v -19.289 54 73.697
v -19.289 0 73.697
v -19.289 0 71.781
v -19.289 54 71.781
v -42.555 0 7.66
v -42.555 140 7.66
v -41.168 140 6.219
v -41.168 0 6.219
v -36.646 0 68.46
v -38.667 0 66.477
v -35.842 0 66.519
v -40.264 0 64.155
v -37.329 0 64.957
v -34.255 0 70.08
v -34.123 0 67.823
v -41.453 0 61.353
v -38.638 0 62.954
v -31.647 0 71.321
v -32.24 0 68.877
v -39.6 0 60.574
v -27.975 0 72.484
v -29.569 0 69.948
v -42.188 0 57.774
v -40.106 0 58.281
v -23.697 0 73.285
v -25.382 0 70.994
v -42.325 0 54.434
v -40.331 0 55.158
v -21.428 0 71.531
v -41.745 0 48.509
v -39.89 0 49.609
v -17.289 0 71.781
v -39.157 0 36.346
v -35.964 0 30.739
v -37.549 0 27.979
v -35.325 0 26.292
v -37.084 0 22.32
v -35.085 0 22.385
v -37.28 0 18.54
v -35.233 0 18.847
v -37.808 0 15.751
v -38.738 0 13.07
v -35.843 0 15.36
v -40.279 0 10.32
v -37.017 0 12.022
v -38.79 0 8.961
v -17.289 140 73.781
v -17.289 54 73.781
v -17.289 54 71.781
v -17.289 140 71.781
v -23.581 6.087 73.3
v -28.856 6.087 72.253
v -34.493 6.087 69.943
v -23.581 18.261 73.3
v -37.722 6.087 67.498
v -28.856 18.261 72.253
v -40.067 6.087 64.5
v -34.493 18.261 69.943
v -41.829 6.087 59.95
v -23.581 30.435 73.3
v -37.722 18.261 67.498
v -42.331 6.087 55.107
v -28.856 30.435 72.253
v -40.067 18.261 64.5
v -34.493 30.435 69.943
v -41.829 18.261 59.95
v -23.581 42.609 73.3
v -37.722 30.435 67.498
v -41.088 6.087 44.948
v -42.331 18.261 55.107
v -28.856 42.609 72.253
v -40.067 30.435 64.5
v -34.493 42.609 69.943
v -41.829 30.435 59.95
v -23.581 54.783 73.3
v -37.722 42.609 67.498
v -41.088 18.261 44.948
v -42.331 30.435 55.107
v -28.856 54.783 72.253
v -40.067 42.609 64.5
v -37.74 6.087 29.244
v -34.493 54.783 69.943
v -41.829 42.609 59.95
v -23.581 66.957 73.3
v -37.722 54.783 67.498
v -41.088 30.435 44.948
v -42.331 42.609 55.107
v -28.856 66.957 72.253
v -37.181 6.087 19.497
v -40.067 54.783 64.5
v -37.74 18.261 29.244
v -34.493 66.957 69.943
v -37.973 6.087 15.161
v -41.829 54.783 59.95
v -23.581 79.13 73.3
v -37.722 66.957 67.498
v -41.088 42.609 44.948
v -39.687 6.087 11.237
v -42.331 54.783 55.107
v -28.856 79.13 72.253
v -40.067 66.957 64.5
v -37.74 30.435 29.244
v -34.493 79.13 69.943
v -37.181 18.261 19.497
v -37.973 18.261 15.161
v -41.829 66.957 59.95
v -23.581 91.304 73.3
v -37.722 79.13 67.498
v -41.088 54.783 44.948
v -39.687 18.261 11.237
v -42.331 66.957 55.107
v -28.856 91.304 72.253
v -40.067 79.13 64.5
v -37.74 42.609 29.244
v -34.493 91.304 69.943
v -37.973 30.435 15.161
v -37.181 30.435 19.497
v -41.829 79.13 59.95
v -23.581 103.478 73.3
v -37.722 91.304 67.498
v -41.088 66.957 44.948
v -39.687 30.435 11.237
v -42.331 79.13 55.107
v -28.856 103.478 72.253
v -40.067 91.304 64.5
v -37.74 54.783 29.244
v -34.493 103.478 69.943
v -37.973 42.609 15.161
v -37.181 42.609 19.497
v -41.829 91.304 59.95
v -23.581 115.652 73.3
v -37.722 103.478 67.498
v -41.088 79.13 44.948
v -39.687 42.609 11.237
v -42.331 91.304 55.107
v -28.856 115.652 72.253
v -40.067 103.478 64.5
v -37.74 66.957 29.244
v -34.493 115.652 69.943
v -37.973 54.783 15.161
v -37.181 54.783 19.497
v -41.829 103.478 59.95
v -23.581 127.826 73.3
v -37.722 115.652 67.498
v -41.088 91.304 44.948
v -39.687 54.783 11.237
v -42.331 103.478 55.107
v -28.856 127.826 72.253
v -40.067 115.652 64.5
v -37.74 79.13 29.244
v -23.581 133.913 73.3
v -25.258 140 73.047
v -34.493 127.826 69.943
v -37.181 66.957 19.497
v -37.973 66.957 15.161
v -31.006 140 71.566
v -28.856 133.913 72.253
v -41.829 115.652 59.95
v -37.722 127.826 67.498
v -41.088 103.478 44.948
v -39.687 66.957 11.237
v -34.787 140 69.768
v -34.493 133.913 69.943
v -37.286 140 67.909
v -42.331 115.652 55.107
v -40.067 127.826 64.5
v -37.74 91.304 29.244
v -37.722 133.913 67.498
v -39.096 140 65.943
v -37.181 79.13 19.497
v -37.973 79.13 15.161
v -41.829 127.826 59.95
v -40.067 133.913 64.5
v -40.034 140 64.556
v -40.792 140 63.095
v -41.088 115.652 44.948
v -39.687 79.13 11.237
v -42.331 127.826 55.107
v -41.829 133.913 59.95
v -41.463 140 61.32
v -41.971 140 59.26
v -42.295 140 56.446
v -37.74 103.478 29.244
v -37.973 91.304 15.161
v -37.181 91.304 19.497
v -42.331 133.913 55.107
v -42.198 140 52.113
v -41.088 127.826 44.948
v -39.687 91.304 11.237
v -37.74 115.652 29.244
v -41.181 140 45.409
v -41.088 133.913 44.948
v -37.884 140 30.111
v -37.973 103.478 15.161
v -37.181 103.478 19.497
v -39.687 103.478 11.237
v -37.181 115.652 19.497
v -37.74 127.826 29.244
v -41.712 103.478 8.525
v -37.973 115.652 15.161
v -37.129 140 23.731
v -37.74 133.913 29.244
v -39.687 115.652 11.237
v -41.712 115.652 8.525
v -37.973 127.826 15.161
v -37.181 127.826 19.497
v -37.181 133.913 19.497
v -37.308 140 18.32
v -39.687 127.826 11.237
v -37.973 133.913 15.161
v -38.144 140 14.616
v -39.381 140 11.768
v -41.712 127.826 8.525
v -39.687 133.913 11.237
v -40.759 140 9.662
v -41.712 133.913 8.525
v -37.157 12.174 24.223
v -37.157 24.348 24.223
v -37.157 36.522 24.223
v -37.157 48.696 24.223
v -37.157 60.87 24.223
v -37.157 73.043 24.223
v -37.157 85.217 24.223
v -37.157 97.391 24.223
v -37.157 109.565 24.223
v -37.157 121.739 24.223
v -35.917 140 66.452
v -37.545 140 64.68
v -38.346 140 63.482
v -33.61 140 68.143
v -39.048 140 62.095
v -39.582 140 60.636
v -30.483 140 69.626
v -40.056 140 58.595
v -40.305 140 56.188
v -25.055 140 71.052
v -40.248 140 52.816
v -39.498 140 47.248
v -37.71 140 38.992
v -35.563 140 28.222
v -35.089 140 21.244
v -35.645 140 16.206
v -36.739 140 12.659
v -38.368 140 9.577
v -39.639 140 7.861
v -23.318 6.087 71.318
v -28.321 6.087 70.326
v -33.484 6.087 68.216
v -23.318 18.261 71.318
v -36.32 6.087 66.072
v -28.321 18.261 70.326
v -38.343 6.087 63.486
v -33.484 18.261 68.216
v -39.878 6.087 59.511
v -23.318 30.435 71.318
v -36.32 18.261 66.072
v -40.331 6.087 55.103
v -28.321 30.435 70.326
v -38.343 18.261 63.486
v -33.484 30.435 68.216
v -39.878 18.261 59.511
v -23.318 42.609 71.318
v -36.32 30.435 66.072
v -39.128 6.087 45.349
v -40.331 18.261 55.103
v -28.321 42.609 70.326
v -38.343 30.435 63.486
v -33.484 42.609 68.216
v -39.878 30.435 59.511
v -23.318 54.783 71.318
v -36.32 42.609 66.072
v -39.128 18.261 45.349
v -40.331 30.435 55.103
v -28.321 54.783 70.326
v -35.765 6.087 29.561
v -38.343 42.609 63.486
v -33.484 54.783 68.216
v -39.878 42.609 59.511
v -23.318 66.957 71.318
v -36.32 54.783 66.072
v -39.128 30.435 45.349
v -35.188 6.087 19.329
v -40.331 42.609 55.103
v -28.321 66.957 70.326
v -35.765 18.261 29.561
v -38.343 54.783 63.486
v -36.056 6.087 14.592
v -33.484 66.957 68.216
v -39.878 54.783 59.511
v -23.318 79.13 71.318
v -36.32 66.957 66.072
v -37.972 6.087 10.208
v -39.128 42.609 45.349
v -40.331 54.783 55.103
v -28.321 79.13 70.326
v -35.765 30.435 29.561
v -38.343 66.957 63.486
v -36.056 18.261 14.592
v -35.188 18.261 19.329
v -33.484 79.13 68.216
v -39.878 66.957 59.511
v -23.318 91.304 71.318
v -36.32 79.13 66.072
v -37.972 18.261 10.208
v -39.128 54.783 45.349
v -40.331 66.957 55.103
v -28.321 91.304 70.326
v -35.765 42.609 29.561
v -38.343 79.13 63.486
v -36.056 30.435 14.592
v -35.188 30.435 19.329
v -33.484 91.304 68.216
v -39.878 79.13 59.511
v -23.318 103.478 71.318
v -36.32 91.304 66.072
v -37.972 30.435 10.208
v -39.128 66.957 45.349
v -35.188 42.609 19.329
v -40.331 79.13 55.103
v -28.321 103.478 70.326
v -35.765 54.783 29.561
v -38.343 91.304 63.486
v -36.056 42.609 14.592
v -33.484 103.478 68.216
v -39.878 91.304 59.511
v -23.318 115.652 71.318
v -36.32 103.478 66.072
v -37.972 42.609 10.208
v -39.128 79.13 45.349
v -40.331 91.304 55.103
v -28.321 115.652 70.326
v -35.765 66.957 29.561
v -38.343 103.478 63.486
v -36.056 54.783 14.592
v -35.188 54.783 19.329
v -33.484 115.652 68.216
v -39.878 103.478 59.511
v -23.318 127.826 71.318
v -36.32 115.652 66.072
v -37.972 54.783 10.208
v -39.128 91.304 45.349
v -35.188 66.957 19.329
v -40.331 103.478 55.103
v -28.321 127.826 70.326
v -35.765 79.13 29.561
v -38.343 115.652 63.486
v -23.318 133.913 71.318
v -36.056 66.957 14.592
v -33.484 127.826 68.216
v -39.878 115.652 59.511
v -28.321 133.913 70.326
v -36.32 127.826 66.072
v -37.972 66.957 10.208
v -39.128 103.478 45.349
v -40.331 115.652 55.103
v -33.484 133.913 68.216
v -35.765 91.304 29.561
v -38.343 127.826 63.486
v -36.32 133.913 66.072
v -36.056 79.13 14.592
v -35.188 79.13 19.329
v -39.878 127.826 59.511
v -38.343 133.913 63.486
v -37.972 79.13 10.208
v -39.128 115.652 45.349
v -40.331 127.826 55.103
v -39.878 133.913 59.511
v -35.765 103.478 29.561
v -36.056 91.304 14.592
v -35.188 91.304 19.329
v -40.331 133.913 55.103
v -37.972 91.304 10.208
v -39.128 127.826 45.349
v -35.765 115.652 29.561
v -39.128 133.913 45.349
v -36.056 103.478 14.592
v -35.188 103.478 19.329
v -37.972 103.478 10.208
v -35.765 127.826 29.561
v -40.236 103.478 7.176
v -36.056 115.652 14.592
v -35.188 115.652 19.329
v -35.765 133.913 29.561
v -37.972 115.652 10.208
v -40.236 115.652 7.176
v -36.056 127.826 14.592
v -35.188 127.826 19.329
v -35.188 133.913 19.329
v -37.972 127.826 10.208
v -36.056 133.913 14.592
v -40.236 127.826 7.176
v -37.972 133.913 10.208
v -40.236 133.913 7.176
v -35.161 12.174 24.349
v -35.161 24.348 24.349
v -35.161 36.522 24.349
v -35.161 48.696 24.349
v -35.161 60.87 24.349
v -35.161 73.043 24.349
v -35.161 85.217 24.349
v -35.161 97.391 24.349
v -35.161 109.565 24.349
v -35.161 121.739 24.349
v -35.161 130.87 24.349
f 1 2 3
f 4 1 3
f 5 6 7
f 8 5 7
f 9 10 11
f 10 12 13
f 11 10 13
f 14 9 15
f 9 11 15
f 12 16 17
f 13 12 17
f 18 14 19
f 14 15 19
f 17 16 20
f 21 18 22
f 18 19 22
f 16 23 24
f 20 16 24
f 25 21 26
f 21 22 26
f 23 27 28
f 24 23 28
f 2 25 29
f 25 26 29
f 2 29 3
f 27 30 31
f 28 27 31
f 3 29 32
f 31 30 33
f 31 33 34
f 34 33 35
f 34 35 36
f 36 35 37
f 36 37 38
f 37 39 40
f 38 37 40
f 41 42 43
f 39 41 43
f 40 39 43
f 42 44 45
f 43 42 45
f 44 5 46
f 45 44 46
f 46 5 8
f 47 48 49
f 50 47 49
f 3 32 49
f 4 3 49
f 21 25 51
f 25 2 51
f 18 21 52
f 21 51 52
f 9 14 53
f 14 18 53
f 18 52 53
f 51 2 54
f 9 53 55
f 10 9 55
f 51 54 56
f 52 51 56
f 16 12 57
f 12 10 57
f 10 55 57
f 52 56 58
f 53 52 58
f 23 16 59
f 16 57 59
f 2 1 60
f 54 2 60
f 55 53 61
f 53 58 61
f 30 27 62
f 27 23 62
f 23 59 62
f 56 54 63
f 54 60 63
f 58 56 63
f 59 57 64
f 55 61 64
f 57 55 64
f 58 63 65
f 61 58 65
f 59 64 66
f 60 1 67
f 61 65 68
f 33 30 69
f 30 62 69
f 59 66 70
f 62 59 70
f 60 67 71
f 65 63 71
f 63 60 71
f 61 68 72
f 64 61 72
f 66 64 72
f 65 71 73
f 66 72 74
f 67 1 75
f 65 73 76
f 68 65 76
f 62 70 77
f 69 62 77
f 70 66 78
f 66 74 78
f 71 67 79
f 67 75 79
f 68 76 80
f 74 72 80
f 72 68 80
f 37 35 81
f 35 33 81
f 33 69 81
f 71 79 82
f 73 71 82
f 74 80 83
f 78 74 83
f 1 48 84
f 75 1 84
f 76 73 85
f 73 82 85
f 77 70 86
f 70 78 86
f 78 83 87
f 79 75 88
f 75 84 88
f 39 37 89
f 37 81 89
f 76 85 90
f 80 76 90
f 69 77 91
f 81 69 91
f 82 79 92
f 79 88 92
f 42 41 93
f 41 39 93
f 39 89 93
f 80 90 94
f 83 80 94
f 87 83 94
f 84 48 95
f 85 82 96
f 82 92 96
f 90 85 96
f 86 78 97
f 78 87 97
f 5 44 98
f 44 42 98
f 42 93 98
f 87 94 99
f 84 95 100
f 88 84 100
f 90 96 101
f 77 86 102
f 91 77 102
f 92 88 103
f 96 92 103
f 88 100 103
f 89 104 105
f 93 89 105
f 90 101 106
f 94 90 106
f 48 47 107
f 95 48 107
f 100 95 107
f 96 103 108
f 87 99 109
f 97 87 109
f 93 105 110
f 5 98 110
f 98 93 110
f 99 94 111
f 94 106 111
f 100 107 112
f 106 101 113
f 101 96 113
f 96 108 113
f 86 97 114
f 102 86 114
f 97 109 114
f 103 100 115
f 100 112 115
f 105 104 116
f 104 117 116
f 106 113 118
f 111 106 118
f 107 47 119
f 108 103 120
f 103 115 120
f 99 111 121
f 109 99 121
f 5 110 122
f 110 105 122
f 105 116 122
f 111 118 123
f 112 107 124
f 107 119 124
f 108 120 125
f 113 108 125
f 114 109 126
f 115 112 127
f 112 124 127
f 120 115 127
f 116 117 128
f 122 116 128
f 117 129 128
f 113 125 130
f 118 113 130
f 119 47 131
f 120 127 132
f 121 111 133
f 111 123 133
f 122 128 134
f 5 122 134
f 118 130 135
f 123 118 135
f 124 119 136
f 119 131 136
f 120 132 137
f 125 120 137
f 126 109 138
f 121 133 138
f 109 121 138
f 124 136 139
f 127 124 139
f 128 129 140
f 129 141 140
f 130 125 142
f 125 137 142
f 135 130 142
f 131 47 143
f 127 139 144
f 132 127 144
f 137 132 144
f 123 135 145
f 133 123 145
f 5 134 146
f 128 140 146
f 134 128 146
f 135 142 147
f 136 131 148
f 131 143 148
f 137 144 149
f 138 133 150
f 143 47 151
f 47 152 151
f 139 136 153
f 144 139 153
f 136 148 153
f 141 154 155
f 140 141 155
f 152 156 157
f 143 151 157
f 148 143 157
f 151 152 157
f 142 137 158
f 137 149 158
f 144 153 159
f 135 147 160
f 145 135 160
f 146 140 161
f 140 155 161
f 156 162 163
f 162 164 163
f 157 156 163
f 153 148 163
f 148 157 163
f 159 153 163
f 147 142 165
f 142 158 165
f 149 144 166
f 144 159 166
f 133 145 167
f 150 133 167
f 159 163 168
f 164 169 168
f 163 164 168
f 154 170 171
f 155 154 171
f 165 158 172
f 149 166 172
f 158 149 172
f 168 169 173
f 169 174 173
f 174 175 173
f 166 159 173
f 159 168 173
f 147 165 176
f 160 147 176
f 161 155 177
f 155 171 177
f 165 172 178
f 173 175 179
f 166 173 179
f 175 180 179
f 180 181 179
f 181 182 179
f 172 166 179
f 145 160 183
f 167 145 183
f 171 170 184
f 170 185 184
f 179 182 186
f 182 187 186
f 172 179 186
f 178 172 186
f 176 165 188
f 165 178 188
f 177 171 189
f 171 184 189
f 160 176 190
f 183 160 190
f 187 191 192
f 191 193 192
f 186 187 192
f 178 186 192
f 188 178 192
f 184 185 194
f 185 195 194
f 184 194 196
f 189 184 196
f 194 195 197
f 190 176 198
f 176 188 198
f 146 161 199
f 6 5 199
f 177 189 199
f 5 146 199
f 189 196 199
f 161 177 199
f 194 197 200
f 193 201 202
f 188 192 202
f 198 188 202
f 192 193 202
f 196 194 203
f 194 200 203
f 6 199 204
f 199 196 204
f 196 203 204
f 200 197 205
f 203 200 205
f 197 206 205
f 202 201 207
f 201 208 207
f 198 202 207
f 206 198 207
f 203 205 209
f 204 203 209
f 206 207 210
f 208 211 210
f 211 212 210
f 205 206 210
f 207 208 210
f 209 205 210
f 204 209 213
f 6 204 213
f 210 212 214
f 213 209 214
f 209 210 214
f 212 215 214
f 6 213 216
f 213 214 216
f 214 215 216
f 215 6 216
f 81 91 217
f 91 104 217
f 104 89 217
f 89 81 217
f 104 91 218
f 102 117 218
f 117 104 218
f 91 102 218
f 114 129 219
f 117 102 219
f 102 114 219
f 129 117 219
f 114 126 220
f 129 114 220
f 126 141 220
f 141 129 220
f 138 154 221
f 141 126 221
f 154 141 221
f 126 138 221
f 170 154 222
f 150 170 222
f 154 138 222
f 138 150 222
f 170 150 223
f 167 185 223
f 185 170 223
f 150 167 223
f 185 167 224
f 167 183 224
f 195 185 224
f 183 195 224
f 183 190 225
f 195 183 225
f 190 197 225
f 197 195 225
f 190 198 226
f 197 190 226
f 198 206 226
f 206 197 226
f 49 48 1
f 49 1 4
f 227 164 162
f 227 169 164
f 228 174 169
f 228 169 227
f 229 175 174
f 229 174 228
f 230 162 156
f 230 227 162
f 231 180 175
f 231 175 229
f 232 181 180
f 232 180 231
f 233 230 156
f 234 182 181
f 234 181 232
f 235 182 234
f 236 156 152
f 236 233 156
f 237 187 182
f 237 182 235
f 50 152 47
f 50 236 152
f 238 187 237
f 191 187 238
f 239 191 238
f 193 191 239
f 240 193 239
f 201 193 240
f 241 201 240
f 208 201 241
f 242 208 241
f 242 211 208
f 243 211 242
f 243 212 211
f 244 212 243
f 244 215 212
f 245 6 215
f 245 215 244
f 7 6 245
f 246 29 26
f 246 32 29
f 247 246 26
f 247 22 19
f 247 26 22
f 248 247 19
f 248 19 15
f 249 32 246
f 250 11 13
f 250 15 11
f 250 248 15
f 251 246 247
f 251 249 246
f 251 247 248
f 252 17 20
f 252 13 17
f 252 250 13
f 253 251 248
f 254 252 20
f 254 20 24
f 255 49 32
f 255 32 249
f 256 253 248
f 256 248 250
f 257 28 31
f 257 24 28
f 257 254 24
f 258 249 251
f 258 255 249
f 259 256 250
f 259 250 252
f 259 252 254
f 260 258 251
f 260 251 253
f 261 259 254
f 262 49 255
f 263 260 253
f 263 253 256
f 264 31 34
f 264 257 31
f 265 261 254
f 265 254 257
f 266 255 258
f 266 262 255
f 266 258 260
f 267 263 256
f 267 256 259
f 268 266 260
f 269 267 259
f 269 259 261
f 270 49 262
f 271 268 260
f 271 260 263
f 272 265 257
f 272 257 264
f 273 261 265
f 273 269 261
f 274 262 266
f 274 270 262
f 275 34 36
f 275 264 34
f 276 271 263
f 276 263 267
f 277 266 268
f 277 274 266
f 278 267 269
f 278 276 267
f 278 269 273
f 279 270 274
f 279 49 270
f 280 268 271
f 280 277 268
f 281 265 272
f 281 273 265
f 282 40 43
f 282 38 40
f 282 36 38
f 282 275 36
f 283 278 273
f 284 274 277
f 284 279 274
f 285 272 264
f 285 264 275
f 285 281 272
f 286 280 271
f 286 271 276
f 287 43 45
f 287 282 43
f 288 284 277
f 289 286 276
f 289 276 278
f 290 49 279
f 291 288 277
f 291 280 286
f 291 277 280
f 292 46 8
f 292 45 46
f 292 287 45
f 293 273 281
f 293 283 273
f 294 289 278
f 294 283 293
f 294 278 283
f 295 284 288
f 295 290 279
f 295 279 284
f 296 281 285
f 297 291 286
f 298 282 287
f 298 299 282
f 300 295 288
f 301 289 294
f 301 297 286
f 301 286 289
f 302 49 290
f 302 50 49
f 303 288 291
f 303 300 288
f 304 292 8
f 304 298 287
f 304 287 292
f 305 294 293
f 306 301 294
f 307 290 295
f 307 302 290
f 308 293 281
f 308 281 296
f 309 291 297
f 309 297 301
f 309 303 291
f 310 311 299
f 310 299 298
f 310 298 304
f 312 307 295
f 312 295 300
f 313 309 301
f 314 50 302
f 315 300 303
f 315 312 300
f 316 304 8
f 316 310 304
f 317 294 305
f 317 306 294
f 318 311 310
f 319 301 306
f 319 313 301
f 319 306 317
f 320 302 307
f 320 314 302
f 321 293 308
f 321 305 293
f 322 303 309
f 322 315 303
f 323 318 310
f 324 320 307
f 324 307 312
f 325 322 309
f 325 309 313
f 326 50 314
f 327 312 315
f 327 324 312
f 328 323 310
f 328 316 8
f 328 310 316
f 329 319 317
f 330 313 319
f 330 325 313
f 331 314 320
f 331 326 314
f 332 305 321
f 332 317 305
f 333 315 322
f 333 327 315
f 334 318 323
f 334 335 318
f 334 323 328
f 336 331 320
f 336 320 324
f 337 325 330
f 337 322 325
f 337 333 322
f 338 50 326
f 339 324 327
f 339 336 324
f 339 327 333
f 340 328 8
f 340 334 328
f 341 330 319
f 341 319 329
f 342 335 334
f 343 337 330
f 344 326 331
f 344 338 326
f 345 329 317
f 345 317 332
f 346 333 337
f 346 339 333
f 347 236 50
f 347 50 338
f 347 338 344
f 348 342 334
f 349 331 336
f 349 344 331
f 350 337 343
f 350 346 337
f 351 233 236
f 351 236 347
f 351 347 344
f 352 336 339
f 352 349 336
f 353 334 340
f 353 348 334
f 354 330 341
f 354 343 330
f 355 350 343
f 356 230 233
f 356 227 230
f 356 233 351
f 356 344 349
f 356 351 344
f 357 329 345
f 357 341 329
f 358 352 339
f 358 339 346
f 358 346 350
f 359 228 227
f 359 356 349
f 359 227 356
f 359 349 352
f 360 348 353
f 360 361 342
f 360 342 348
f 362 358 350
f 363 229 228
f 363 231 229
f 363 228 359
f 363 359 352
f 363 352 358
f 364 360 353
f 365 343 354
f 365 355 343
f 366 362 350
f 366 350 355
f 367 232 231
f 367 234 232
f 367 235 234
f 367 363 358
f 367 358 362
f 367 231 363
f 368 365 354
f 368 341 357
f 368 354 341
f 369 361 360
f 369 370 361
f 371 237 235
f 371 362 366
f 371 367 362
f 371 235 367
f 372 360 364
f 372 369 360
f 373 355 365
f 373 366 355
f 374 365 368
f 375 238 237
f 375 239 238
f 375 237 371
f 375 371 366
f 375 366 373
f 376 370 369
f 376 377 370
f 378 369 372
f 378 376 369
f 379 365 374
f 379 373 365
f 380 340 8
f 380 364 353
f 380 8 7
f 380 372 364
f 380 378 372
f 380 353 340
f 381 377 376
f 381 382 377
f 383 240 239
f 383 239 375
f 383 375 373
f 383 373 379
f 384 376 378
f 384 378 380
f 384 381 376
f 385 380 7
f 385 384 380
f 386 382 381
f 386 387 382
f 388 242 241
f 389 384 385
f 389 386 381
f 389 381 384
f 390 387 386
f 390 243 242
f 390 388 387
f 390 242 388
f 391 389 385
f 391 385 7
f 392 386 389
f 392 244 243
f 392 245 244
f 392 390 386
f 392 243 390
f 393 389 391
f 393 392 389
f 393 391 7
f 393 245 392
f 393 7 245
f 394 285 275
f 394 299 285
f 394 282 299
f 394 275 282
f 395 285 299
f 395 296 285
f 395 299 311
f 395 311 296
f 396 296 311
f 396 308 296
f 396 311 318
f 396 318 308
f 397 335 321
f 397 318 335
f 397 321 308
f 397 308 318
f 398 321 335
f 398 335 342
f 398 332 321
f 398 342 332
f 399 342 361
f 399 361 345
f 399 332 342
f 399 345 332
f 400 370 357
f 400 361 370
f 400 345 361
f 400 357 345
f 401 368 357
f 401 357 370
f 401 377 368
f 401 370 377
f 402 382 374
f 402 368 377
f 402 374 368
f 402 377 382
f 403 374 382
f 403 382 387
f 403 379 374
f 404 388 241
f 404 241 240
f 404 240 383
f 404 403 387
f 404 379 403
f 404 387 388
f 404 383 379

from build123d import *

# Parameters (mm, degrees)
CROQUIS1_W              = 30
CROQUIS1_H              = 80
SALIENTE_EXTRUIR1_DEPTH = 140
CORTAR_EXTRUIR1_DEPTH   = 141
CROQUIS3_W              = 2.000851936
CROQUIS3_H              = 54
CORTAR_EXTRUIR2_DEPTH   = 2


with BuildPart() as part:
    # Croquis1 → Saliente-Extruir1 (new body)
    with BuildSketch(Plane(origin=(0, 0, 0), x_dir=(1, 0, 0), z_dir=(0, 1, 0))):
        with Locations((-32.289164152, -33.781461754)):
            Rectangle(CROQUIS1_W, CROQUIS1_H)
    extrude(amount=SALIENTE_EXTRUIR1_DEPTH)

    # Croquis2 → Cortar-Extruir1 (cut, through all)
    with BuildSketch(Plane(origin=(0, 140, 0), x_dir=(1, 0, 0), z_dir=(0, 1, 0))):
        with BuildLine():
            Line((-47.289164152, -73.781461754), (-17.289164152, -73.781461754))
            add(Edge.make_bspline(
                [(-17.289164152, -73.781461754), (-18.028790745, -73.760167812), (-19.536736039, -73.694334347), (-21.619201378, -73.534198465), (-23.60026042, -73.310865821), (-26.085305832, -72.929731587), (-28.923554013, -72.295740091), (-31.925616811, -71.278451947), (-34.556591531, -69.988486168), (-37.556020515, -67.907598696), (-40.340850878, -64.61069966), (-42.041141092, -59.98828157), (-42.46994198, -55.1343895), (-42.064232899, -50.118165725), (-40.821359448, -43.247598034), (-39.046239792, -36.169847805), (-37.670394081, -29.215175232), (-37.054360796, -24.173452889), (-37.05194859, -19.429814206), (-37.692700661, -15.813013959), (-38.661503867, -13.133702332), (-39.638797415, -11.223052021), (-40.693571404, -9.698906715), (-41.695258282, -8.524055184), (-42.26504447, -7.938852239), (-42.554999929, -7.659734641)],
                knots=[0, 0, 0, 0, 0.015252929, 0.030505859, 0.045758788, 0.061011718, 0.091517577, 0.122023436, 0.152529294, 0.183035153, 0.244046871, 0.305058589, 0.366070307, 0.427082025, 0.488093742, 0.610117178, 0.671128896, 0.732140613, 0.793152331, 0.854164049, 0.884669908, 0.915175767, 0.945681626, 0.960934555, 0.976187485, 0.976187485, 0.976187485, 0.976187485], degree=3))
            Line((-42.554999929, -7.659734641), (-41.167971247, -6.218848999))
            add(Edge.make_bspline(
                [(-17.289164149, -71.780609724), (-17.989897624, -71.759867801), (-19.437647711, -71.696034282), (-21.431834226, -71.542554366), (-23.339287673, -71.327444133), (-25.713389965, -70.963135168), (-28.394980997, -70.36292597), (-31.171968634, -69.419957516), (-33.551385324, -68.250670285), (-36.187417425, -66.417246395), (-38.572343047, -63.588661041), (-40.058368199, -59.579977963), (-40.461410262, -55.159116811), (-40.081165503, -50.399485353), (-38.873478235, -43.707477121), (-37.101064693, -36.637590027), (-35.696305064, -29.546732583), (-35.055039174, -24.316937629), (-35.047218805, -19.281220812), (-35.742523876, -15.323177806), (-36.820958485, -12.337295039), (-37.918383572, -10.191651316), (-39.099645947, -8.484992992), (-40.218055479, -7.173641955), (-40.847051558, -6.527773455), (-41.167971247, -6.218848999)],
                knots=[0.000406696, 0.000406696, 0.000406696, 0.000406696, 0.015252929, 0.030505859, 0.045758788, 0.061011718, 0.091517577, 0.122023436, 0.152529294, 0.183035153, 0.244046871, 0.305058589, 0.366070307, 0.427082025, 0.488093742, 0.610117178, 0.671128896, 0.732140613, 0.793152331, 0.854164049, 0.884669908, 0.915175767, 0.945681626, 0.960934555, 0.976187485, 0.976187485, 0.976187485, 0.976187485], degree=3))
            Line((-17.289164152, -71.780609818), (-17.289164152, 6.218538246))
            Line((-17.289164152, 6.218538246), (-47.289164152, 6.218538246))
            Line((-47.289164152, 6.218538246), (-47.289164152, -73.781461754))
        make_face()
    extrude(amount=-CORTAR_EXTRUIR1_DEPTH, mode=Mode.SUBTRACT)

    # Croquis3 → Cortar-Extruir2 (cut)
    with BuildSketch(Plane(origin=(-17.289164152, 0, 0), x_dir=(0, 0, -1), z_dir=(1, 0, 0))):
        with Locations((-72.781035786, 27)):
            Rectangle(CROQUIS3_W, CROQUIS3_H)
    extrude(amount=-CORTAR_EXTRUIR2_DEPTH, mode=Mode.SUBTRACT)


solid = part.part
